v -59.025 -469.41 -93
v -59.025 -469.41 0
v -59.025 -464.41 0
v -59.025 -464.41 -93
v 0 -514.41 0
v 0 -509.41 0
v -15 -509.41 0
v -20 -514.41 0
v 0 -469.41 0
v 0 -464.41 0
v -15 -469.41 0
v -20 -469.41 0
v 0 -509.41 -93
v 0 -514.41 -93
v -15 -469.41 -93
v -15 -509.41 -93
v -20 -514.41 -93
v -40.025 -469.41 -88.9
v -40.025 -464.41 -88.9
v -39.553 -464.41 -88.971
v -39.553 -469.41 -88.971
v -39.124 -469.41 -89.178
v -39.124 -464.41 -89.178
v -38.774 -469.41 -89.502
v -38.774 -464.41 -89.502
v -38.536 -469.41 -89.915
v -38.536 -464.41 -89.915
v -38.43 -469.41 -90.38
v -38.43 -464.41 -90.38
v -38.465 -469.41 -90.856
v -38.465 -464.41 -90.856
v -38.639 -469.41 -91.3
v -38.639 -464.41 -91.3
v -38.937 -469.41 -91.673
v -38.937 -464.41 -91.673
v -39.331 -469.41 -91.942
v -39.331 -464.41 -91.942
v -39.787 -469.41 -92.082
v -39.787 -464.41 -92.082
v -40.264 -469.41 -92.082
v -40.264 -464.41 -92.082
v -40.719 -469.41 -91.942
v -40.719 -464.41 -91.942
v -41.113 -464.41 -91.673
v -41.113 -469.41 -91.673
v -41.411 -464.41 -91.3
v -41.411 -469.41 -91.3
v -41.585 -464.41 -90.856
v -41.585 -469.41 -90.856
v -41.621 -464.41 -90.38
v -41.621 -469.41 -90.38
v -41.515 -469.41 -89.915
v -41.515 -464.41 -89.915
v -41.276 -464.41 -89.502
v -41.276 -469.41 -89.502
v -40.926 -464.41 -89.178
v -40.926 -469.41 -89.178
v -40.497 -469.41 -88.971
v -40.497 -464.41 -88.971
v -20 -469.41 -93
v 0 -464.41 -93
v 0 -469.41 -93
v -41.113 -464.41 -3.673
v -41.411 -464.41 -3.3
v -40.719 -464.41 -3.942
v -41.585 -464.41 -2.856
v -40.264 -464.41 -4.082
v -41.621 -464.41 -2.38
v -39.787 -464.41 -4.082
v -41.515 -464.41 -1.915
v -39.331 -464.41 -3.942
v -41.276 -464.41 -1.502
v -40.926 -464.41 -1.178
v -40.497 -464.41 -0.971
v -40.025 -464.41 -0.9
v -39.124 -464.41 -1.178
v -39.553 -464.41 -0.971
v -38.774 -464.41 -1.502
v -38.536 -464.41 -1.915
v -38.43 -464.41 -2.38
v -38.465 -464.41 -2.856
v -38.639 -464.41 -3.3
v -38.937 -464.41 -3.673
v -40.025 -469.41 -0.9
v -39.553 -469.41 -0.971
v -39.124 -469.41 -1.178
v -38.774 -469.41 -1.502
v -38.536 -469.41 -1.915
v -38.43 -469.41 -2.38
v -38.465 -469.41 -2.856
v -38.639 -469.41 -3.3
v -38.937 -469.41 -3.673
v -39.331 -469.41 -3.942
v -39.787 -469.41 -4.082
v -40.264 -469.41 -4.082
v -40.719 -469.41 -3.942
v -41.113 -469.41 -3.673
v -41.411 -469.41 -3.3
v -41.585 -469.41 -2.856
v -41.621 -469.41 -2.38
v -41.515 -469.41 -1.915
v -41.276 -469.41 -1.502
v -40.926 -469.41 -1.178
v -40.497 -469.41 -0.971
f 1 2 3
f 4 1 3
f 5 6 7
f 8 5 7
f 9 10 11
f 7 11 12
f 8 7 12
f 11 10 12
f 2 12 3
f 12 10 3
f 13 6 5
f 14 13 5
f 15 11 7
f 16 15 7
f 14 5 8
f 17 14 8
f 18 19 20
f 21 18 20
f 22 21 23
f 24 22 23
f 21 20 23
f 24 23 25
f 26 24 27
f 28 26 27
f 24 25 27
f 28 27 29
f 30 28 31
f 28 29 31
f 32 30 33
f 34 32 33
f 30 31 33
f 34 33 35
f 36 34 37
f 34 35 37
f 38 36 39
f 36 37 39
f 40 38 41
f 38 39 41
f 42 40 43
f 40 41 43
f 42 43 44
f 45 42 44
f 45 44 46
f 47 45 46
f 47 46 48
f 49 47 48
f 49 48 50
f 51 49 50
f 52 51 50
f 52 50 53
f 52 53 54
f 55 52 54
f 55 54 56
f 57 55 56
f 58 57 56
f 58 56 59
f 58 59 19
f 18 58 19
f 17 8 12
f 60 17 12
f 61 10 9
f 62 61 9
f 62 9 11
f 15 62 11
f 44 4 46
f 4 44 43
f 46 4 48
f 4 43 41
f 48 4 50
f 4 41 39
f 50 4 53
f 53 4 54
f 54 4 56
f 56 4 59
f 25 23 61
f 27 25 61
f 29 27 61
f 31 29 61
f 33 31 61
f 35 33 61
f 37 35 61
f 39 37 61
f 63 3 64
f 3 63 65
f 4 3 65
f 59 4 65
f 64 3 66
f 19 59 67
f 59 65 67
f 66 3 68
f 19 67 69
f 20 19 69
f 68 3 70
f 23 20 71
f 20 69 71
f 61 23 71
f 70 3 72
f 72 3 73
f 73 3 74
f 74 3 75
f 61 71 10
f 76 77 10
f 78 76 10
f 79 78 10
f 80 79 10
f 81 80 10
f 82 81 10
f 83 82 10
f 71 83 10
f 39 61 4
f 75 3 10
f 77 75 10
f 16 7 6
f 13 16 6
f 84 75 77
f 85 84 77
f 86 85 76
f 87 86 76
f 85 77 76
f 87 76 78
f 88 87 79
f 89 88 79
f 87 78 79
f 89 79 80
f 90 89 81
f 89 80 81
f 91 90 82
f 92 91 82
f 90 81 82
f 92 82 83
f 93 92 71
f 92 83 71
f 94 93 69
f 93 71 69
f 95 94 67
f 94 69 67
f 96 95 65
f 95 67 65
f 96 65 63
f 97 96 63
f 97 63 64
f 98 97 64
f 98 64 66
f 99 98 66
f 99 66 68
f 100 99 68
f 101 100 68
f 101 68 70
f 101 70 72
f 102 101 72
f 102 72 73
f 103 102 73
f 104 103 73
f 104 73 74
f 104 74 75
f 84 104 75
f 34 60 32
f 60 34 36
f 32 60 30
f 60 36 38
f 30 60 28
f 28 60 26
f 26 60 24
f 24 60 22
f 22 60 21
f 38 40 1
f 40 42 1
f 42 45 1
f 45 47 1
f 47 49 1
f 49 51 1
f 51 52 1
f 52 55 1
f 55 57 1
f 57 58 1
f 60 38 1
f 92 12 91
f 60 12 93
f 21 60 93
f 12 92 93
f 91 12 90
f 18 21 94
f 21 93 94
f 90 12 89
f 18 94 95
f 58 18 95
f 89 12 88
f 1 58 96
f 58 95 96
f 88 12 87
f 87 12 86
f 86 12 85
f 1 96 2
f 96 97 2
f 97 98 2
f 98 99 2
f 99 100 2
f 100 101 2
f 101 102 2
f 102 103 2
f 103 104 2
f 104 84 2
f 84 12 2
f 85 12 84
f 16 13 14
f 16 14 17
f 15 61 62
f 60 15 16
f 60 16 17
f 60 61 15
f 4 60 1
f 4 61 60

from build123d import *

# Parameters (mm, degrees)
BOSS_EXTRU_1_DEPTH      = 93
ESQUISSE2_R             = 1.6
ENL_V_MAT_EXTRU_1_DEPTH = 121.966784717


with BuildPart() as part:
    # Esquisse1 → Boss.-Extru.1 (new body)
    with BuildSketch(Plane.XY):
        Polygon((-20, -469.409867617), (-59.025104869, -469.409867617), (-59.025104869, -464.409867617), (0, -464.409867617), (0, -469.409867617), (-15, -469.409867617), (-15, -509.409867617), (0, -509.409867617), (0, -514.409867617), (-20, -514.409867617), align=None)
    extrude(amount=-BOSS_EXTRU_1_DEPTH)

    # Esquisse2 → Enlèv. mat.-Extru.1 (cut, through all)
    with BuildSketch(Plane(origin=(0, -464.409867617, 0), x_dir=(1, 0, 0), z_dir=(0, 1, 0))):
        with Locations(Location((-40.025104869, 90.5, 0), (0, 0, 270))):
            Circle(ESQUISSE2_R)
        with Locations(Location((-40.025104869, 2.5, 0), (0, 0, 270))):
            Circle(ESQUISSE2_R)
    extrude(amount=-ENL_V_MAT_EXTRU_1_DEPTH, mode=Mode.SUBTRACT)


solid = part.part
